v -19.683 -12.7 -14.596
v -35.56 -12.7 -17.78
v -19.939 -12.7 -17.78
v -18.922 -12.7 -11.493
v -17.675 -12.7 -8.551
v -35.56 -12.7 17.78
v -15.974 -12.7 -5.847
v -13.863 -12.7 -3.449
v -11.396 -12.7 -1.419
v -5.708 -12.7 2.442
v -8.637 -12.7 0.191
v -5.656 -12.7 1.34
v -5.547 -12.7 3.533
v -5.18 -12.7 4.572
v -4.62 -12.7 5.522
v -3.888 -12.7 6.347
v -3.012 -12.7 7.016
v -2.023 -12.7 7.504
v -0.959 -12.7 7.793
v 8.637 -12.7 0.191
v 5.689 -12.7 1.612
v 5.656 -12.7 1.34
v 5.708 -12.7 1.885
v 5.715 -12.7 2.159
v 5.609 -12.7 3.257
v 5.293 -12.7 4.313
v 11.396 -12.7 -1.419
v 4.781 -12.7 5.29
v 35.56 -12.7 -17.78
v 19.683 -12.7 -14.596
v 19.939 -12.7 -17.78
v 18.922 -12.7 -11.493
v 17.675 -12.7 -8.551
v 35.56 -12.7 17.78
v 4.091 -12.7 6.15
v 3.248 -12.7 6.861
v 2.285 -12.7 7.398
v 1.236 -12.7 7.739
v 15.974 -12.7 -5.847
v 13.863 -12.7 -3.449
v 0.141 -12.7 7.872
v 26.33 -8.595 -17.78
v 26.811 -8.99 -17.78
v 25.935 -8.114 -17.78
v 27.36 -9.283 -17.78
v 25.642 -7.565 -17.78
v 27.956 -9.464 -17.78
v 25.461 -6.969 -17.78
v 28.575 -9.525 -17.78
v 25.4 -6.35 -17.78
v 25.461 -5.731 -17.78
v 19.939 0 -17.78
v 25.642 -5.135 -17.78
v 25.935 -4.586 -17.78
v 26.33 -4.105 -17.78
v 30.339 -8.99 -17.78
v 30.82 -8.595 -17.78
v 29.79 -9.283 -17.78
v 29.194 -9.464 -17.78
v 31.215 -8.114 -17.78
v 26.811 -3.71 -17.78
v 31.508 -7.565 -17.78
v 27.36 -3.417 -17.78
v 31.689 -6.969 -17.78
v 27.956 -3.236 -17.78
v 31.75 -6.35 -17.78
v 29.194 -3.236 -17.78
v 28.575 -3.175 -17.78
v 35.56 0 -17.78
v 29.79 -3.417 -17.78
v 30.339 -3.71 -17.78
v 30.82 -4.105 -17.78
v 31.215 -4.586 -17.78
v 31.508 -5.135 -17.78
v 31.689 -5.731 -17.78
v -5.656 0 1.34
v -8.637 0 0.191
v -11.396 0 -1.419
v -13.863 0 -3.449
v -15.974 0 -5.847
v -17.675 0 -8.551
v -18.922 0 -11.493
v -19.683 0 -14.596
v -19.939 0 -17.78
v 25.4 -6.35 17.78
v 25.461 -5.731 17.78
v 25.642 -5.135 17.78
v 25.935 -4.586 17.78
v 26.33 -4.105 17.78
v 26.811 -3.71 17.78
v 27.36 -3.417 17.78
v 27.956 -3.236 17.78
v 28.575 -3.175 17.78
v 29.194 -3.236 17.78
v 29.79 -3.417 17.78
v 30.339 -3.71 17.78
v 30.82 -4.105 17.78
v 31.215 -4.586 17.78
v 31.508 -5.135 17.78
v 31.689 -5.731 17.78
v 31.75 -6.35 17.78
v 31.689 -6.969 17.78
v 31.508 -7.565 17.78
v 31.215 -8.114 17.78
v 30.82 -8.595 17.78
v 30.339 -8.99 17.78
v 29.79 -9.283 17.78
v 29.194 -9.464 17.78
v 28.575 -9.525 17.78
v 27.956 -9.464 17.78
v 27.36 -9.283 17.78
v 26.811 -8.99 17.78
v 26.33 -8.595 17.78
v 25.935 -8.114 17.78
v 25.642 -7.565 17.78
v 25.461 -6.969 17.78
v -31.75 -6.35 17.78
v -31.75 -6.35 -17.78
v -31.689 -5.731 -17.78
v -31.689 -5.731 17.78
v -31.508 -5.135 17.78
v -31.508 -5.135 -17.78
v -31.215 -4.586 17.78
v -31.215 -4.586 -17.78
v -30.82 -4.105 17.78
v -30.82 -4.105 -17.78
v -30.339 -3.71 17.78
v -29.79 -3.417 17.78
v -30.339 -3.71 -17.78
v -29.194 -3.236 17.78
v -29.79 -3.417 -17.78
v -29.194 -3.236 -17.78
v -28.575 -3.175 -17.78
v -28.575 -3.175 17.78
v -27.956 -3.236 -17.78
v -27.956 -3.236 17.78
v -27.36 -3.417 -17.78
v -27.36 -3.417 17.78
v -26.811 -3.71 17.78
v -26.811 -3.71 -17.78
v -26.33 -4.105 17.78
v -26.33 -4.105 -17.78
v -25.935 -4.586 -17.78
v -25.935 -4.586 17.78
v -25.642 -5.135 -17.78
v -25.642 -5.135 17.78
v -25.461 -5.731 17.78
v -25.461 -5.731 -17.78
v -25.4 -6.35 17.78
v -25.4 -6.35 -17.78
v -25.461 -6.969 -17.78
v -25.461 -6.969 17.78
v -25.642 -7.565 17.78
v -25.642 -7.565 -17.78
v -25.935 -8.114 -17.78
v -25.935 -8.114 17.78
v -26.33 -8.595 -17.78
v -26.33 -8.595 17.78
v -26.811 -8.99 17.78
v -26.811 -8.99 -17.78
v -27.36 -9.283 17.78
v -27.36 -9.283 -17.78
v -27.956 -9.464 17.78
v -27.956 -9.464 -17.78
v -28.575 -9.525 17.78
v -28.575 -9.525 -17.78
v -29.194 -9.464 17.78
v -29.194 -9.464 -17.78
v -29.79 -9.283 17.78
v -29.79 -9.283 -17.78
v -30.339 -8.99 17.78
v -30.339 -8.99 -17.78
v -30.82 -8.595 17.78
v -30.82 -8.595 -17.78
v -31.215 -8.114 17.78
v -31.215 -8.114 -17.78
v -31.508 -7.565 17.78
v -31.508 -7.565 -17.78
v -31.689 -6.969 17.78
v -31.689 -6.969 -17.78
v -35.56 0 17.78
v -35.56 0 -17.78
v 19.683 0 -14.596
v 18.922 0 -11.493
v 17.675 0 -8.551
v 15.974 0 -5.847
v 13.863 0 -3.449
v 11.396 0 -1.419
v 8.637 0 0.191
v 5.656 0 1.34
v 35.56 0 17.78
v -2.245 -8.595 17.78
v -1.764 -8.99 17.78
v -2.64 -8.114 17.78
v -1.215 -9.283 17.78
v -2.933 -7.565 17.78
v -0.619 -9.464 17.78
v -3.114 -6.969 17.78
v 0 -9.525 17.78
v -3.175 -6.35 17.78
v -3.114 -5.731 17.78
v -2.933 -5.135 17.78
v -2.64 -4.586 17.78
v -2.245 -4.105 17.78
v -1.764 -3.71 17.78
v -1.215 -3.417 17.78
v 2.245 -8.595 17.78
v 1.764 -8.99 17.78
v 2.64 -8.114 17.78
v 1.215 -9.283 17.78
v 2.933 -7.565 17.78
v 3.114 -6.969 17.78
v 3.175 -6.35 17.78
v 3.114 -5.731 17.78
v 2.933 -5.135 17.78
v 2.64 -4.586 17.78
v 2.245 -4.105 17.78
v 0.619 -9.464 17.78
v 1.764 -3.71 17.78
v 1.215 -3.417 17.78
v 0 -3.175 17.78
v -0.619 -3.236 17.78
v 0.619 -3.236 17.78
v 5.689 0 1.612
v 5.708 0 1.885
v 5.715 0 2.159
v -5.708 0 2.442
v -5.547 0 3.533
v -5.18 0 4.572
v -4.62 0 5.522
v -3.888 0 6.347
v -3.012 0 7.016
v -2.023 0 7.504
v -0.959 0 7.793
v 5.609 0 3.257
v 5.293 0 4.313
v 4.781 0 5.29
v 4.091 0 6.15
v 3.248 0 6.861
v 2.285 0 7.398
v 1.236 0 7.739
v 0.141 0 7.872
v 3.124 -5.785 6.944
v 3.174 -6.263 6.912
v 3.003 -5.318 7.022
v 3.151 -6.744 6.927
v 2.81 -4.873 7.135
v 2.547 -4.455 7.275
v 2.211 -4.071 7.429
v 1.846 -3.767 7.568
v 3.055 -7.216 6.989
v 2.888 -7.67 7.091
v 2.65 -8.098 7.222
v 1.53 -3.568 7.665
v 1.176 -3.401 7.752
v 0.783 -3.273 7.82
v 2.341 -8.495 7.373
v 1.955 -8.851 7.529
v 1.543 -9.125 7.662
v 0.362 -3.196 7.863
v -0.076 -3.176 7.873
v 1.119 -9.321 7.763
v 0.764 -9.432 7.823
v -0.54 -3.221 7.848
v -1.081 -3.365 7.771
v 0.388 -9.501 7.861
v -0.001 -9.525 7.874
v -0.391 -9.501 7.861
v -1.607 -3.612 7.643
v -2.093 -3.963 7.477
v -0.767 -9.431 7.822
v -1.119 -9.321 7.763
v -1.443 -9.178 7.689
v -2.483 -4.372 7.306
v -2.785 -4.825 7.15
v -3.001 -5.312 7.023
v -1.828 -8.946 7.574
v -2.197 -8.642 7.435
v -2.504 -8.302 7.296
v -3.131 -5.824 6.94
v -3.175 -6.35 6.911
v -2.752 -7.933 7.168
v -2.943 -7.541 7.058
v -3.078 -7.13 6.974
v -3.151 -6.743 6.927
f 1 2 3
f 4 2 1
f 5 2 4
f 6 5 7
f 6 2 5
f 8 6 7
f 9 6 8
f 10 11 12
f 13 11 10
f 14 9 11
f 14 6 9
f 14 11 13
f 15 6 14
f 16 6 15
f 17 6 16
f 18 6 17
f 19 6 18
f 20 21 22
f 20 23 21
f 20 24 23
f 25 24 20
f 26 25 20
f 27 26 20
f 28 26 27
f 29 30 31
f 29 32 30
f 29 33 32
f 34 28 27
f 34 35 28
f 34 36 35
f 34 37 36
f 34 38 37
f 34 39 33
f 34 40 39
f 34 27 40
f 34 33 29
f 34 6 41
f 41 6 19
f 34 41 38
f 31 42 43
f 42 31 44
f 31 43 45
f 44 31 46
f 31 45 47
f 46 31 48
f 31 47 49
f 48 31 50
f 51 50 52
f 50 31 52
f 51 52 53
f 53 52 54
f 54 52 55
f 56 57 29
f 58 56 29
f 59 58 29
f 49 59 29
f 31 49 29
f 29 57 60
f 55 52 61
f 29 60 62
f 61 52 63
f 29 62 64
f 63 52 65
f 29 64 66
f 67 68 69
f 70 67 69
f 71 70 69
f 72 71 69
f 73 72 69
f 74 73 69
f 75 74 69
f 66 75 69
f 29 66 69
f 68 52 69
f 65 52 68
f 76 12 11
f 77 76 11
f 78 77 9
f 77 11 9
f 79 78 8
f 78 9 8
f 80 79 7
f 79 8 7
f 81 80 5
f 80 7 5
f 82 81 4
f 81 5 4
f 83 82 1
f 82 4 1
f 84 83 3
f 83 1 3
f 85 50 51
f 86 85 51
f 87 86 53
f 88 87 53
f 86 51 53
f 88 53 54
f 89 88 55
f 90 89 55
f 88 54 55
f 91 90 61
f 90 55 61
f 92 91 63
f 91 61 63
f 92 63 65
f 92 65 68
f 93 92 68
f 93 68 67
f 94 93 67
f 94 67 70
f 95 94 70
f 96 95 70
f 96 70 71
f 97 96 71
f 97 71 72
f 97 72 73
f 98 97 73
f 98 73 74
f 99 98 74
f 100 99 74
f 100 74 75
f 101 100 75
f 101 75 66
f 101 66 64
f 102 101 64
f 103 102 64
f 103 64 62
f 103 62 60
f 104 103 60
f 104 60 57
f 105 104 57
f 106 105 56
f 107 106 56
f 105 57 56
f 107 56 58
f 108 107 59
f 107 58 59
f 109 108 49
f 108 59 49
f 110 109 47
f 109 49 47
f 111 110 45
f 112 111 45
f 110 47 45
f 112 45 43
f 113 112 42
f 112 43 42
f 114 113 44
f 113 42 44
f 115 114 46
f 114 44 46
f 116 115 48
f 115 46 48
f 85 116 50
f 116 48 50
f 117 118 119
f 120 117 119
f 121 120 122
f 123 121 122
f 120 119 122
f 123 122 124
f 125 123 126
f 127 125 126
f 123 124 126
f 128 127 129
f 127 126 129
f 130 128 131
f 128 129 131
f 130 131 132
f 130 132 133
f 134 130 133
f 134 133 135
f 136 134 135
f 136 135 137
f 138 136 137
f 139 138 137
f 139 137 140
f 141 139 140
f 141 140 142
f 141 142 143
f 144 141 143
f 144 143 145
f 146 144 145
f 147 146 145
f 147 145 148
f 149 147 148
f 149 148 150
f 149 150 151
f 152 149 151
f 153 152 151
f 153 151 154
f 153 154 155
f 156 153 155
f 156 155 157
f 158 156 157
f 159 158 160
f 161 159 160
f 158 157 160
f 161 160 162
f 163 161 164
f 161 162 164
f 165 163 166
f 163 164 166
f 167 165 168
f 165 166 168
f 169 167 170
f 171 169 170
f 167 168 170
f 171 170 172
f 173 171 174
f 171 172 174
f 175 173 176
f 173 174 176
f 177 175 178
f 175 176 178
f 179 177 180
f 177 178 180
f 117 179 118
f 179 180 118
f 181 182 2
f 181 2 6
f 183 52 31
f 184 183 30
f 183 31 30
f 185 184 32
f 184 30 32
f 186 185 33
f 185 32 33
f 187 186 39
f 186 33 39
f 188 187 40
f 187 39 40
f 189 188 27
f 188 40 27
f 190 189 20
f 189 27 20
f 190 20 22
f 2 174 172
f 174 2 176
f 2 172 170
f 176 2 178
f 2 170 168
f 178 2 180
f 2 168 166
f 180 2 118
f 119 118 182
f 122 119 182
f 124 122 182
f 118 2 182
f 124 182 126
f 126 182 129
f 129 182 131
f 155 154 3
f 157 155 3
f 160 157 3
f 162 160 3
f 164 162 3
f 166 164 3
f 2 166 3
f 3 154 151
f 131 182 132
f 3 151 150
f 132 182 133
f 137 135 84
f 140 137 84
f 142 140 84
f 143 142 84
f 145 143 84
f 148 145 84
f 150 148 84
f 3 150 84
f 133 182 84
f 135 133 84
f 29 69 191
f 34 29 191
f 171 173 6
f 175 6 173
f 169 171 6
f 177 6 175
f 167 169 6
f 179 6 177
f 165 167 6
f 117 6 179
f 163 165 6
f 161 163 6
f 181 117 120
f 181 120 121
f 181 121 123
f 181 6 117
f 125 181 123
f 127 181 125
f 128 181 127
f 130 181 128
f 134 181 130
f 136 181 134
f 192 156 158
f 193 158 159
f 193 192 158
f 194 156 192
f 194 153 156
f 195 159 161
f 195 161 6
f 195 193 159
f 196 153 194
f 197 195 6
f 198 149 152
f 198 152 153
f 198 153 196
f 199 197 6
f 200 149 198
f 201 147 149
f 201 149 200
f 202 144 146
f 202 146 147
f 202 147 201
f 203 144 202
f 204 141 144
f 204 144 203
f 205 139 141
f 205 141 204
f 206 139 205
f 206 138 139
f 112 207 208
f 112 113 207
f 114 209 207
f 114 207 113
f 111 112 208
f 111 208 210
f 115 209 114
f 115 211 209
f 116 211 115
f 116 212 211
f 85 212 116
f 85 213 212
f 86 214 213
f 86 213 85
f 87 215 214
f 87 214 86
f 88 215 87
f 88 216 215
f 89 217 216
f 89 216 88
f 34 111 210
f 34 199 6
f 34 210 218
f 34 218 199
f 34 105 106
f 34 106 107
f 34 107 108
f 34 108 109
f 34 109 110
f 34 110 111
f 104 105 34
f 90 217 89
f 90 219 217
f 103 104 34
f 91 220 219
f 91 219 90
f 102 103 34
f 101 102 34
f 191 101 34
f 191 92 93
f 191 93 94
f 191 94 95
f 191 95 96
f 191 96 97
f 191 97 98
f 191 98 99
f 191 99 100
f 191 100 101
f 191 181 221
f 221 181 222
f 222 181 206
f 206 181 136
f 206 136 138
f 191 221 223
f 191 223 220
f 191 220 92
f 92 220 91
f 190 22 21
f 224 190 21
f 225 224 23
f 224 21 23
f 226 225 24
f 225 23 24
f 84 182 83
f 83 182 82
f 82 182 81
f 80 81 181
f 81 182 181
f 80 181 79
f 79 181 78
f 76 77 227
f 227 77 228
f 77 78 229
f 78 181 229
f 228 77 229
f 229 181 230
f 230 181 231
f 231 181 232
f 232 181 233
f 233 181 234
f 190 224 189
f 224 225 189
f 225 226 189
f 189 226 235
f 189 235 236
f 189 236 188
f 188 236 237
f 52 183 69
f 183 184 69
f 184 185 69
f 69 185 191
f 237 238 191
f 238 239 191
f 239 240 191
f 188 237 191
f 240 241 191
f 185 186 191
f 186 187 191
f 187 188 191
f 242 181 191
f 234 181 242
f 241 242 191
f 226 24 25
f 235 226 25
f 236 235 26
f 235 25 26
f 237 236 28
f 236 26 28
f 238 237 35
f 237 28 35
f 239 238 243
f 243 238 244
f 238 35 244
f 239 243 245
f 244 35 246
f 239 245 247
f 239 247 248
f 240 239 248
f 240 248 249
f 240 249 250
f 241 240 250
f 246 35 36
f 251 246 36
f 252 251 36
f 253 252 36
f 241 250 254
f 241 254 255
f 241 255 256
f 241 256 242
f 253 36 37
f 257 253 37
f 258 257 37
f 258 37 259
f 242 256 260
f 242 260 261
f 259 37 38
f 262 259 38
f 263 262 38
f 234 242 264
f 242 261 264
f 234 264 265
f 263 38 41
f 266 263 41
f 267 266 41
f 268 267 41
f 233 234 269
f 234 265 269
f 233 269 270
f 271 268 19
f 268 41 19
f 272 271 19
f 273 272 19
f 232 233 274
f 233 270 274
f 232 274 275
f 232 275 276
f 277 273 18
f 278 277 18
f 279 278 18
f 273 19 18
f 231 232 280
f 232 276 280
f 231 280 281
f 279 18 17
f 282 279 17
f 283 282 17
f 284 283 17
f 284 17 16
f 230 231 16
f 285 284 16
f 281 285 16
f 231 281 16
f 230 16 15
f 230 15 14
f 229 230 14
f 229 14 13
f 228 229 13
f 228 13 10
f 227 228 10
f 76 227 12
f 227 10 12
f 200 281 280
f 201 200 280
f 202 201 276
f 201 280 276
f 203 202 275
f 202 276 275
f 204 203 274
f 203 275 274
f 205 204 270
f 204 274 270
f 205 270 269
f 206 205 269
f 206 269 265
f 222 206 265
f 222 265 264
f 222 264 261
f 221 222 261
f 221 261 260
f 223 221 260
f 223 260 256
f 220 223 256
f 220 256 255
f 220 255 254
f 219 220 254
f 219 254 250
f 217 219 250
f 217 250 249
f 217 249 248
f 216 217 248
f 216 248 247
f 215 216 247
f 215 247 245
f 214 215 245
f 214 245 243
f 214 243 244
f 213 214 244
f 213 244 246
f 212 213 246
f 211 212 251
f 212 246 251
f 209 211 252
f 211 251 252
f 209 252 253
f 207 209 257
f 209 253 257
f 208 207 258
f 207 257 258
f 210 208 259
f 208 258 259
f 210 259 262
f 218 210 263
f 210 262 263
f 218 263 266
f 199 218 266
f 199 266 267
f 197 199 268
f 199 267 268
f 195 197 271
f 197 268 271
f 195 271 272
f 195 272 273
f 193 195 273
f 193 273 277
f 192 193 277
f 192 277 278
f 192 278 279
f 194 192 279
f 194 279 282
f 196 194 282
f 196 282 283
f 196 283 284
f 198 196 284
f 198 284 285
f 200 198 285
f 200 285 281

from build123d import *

# Parameters (mm, degrees)
F0_W     = 71.12
F0_H     = 35.56
F1_DEPTH = 12.7
F3_DEPTH = 12.701
F5_DEPTH = 25.4
F7_D     = 6.35
F7_DEPTH = 50.8
F7_TIP   = 1.9077324654


with BuildPart() as f1:
    # F0 (on Front) → F1 (new body)
    with BuildSketch(Plane.XZ):
        Rectangle(F0_W, F0_H)
    extrude(amount=F1_DEPTH)

    # F2 (on face) → F3 (cut, through all)
    with BuildSketch(Plane.XZ.offset(12.7)):
        with BuildLine():
            Line((-19.939, -17.78), (19.939, -17.78))
            ThreePointArc((19.939, -17.78), (0, 2.159), (-19.939, -17.78))
        make_face()
    extrude(amount=-F3_DEPTH, mode=Mode.SUBTRACT)

    # F4 (on face) → F5 (cut)
    with BuildSketch(Plane.XZ.offset(12.7)):
        with BuildLine():
            ThreePointArc((5.656007165, 1.3399713376), (5.7002327123, 1.7484247619), (5.715, 2.159))
            ThreePointArc((5.715, 2.159), (-0.4105752381, 7.8592327123), (-5.656007165, 1.3399713376))
            ThreePointArc((-5.656007165, 1.3399713376), (0, 2.159), (5.656007165, 1.3399713376))
        make_face()
    extrude(amount=-F5_DEPTH, mode=Mode.SUBTRACT)

    # F7
    with Locations(Plane.XY.offset(17.78)):
        with Locations((-28.575, -6.35), (0, -6.35), (28.575, -6.35)):
            Hole(F7_D / 2, depth=F7_DEPTH)
            with Locations((0, 0, -(F7_DEPTH + F7_TIP / 2))):  # 118° drill point
                Cone(0, F7_D / 2, F7_TIP, mode=Mode.SUBTRACT)


solid = f1.part
